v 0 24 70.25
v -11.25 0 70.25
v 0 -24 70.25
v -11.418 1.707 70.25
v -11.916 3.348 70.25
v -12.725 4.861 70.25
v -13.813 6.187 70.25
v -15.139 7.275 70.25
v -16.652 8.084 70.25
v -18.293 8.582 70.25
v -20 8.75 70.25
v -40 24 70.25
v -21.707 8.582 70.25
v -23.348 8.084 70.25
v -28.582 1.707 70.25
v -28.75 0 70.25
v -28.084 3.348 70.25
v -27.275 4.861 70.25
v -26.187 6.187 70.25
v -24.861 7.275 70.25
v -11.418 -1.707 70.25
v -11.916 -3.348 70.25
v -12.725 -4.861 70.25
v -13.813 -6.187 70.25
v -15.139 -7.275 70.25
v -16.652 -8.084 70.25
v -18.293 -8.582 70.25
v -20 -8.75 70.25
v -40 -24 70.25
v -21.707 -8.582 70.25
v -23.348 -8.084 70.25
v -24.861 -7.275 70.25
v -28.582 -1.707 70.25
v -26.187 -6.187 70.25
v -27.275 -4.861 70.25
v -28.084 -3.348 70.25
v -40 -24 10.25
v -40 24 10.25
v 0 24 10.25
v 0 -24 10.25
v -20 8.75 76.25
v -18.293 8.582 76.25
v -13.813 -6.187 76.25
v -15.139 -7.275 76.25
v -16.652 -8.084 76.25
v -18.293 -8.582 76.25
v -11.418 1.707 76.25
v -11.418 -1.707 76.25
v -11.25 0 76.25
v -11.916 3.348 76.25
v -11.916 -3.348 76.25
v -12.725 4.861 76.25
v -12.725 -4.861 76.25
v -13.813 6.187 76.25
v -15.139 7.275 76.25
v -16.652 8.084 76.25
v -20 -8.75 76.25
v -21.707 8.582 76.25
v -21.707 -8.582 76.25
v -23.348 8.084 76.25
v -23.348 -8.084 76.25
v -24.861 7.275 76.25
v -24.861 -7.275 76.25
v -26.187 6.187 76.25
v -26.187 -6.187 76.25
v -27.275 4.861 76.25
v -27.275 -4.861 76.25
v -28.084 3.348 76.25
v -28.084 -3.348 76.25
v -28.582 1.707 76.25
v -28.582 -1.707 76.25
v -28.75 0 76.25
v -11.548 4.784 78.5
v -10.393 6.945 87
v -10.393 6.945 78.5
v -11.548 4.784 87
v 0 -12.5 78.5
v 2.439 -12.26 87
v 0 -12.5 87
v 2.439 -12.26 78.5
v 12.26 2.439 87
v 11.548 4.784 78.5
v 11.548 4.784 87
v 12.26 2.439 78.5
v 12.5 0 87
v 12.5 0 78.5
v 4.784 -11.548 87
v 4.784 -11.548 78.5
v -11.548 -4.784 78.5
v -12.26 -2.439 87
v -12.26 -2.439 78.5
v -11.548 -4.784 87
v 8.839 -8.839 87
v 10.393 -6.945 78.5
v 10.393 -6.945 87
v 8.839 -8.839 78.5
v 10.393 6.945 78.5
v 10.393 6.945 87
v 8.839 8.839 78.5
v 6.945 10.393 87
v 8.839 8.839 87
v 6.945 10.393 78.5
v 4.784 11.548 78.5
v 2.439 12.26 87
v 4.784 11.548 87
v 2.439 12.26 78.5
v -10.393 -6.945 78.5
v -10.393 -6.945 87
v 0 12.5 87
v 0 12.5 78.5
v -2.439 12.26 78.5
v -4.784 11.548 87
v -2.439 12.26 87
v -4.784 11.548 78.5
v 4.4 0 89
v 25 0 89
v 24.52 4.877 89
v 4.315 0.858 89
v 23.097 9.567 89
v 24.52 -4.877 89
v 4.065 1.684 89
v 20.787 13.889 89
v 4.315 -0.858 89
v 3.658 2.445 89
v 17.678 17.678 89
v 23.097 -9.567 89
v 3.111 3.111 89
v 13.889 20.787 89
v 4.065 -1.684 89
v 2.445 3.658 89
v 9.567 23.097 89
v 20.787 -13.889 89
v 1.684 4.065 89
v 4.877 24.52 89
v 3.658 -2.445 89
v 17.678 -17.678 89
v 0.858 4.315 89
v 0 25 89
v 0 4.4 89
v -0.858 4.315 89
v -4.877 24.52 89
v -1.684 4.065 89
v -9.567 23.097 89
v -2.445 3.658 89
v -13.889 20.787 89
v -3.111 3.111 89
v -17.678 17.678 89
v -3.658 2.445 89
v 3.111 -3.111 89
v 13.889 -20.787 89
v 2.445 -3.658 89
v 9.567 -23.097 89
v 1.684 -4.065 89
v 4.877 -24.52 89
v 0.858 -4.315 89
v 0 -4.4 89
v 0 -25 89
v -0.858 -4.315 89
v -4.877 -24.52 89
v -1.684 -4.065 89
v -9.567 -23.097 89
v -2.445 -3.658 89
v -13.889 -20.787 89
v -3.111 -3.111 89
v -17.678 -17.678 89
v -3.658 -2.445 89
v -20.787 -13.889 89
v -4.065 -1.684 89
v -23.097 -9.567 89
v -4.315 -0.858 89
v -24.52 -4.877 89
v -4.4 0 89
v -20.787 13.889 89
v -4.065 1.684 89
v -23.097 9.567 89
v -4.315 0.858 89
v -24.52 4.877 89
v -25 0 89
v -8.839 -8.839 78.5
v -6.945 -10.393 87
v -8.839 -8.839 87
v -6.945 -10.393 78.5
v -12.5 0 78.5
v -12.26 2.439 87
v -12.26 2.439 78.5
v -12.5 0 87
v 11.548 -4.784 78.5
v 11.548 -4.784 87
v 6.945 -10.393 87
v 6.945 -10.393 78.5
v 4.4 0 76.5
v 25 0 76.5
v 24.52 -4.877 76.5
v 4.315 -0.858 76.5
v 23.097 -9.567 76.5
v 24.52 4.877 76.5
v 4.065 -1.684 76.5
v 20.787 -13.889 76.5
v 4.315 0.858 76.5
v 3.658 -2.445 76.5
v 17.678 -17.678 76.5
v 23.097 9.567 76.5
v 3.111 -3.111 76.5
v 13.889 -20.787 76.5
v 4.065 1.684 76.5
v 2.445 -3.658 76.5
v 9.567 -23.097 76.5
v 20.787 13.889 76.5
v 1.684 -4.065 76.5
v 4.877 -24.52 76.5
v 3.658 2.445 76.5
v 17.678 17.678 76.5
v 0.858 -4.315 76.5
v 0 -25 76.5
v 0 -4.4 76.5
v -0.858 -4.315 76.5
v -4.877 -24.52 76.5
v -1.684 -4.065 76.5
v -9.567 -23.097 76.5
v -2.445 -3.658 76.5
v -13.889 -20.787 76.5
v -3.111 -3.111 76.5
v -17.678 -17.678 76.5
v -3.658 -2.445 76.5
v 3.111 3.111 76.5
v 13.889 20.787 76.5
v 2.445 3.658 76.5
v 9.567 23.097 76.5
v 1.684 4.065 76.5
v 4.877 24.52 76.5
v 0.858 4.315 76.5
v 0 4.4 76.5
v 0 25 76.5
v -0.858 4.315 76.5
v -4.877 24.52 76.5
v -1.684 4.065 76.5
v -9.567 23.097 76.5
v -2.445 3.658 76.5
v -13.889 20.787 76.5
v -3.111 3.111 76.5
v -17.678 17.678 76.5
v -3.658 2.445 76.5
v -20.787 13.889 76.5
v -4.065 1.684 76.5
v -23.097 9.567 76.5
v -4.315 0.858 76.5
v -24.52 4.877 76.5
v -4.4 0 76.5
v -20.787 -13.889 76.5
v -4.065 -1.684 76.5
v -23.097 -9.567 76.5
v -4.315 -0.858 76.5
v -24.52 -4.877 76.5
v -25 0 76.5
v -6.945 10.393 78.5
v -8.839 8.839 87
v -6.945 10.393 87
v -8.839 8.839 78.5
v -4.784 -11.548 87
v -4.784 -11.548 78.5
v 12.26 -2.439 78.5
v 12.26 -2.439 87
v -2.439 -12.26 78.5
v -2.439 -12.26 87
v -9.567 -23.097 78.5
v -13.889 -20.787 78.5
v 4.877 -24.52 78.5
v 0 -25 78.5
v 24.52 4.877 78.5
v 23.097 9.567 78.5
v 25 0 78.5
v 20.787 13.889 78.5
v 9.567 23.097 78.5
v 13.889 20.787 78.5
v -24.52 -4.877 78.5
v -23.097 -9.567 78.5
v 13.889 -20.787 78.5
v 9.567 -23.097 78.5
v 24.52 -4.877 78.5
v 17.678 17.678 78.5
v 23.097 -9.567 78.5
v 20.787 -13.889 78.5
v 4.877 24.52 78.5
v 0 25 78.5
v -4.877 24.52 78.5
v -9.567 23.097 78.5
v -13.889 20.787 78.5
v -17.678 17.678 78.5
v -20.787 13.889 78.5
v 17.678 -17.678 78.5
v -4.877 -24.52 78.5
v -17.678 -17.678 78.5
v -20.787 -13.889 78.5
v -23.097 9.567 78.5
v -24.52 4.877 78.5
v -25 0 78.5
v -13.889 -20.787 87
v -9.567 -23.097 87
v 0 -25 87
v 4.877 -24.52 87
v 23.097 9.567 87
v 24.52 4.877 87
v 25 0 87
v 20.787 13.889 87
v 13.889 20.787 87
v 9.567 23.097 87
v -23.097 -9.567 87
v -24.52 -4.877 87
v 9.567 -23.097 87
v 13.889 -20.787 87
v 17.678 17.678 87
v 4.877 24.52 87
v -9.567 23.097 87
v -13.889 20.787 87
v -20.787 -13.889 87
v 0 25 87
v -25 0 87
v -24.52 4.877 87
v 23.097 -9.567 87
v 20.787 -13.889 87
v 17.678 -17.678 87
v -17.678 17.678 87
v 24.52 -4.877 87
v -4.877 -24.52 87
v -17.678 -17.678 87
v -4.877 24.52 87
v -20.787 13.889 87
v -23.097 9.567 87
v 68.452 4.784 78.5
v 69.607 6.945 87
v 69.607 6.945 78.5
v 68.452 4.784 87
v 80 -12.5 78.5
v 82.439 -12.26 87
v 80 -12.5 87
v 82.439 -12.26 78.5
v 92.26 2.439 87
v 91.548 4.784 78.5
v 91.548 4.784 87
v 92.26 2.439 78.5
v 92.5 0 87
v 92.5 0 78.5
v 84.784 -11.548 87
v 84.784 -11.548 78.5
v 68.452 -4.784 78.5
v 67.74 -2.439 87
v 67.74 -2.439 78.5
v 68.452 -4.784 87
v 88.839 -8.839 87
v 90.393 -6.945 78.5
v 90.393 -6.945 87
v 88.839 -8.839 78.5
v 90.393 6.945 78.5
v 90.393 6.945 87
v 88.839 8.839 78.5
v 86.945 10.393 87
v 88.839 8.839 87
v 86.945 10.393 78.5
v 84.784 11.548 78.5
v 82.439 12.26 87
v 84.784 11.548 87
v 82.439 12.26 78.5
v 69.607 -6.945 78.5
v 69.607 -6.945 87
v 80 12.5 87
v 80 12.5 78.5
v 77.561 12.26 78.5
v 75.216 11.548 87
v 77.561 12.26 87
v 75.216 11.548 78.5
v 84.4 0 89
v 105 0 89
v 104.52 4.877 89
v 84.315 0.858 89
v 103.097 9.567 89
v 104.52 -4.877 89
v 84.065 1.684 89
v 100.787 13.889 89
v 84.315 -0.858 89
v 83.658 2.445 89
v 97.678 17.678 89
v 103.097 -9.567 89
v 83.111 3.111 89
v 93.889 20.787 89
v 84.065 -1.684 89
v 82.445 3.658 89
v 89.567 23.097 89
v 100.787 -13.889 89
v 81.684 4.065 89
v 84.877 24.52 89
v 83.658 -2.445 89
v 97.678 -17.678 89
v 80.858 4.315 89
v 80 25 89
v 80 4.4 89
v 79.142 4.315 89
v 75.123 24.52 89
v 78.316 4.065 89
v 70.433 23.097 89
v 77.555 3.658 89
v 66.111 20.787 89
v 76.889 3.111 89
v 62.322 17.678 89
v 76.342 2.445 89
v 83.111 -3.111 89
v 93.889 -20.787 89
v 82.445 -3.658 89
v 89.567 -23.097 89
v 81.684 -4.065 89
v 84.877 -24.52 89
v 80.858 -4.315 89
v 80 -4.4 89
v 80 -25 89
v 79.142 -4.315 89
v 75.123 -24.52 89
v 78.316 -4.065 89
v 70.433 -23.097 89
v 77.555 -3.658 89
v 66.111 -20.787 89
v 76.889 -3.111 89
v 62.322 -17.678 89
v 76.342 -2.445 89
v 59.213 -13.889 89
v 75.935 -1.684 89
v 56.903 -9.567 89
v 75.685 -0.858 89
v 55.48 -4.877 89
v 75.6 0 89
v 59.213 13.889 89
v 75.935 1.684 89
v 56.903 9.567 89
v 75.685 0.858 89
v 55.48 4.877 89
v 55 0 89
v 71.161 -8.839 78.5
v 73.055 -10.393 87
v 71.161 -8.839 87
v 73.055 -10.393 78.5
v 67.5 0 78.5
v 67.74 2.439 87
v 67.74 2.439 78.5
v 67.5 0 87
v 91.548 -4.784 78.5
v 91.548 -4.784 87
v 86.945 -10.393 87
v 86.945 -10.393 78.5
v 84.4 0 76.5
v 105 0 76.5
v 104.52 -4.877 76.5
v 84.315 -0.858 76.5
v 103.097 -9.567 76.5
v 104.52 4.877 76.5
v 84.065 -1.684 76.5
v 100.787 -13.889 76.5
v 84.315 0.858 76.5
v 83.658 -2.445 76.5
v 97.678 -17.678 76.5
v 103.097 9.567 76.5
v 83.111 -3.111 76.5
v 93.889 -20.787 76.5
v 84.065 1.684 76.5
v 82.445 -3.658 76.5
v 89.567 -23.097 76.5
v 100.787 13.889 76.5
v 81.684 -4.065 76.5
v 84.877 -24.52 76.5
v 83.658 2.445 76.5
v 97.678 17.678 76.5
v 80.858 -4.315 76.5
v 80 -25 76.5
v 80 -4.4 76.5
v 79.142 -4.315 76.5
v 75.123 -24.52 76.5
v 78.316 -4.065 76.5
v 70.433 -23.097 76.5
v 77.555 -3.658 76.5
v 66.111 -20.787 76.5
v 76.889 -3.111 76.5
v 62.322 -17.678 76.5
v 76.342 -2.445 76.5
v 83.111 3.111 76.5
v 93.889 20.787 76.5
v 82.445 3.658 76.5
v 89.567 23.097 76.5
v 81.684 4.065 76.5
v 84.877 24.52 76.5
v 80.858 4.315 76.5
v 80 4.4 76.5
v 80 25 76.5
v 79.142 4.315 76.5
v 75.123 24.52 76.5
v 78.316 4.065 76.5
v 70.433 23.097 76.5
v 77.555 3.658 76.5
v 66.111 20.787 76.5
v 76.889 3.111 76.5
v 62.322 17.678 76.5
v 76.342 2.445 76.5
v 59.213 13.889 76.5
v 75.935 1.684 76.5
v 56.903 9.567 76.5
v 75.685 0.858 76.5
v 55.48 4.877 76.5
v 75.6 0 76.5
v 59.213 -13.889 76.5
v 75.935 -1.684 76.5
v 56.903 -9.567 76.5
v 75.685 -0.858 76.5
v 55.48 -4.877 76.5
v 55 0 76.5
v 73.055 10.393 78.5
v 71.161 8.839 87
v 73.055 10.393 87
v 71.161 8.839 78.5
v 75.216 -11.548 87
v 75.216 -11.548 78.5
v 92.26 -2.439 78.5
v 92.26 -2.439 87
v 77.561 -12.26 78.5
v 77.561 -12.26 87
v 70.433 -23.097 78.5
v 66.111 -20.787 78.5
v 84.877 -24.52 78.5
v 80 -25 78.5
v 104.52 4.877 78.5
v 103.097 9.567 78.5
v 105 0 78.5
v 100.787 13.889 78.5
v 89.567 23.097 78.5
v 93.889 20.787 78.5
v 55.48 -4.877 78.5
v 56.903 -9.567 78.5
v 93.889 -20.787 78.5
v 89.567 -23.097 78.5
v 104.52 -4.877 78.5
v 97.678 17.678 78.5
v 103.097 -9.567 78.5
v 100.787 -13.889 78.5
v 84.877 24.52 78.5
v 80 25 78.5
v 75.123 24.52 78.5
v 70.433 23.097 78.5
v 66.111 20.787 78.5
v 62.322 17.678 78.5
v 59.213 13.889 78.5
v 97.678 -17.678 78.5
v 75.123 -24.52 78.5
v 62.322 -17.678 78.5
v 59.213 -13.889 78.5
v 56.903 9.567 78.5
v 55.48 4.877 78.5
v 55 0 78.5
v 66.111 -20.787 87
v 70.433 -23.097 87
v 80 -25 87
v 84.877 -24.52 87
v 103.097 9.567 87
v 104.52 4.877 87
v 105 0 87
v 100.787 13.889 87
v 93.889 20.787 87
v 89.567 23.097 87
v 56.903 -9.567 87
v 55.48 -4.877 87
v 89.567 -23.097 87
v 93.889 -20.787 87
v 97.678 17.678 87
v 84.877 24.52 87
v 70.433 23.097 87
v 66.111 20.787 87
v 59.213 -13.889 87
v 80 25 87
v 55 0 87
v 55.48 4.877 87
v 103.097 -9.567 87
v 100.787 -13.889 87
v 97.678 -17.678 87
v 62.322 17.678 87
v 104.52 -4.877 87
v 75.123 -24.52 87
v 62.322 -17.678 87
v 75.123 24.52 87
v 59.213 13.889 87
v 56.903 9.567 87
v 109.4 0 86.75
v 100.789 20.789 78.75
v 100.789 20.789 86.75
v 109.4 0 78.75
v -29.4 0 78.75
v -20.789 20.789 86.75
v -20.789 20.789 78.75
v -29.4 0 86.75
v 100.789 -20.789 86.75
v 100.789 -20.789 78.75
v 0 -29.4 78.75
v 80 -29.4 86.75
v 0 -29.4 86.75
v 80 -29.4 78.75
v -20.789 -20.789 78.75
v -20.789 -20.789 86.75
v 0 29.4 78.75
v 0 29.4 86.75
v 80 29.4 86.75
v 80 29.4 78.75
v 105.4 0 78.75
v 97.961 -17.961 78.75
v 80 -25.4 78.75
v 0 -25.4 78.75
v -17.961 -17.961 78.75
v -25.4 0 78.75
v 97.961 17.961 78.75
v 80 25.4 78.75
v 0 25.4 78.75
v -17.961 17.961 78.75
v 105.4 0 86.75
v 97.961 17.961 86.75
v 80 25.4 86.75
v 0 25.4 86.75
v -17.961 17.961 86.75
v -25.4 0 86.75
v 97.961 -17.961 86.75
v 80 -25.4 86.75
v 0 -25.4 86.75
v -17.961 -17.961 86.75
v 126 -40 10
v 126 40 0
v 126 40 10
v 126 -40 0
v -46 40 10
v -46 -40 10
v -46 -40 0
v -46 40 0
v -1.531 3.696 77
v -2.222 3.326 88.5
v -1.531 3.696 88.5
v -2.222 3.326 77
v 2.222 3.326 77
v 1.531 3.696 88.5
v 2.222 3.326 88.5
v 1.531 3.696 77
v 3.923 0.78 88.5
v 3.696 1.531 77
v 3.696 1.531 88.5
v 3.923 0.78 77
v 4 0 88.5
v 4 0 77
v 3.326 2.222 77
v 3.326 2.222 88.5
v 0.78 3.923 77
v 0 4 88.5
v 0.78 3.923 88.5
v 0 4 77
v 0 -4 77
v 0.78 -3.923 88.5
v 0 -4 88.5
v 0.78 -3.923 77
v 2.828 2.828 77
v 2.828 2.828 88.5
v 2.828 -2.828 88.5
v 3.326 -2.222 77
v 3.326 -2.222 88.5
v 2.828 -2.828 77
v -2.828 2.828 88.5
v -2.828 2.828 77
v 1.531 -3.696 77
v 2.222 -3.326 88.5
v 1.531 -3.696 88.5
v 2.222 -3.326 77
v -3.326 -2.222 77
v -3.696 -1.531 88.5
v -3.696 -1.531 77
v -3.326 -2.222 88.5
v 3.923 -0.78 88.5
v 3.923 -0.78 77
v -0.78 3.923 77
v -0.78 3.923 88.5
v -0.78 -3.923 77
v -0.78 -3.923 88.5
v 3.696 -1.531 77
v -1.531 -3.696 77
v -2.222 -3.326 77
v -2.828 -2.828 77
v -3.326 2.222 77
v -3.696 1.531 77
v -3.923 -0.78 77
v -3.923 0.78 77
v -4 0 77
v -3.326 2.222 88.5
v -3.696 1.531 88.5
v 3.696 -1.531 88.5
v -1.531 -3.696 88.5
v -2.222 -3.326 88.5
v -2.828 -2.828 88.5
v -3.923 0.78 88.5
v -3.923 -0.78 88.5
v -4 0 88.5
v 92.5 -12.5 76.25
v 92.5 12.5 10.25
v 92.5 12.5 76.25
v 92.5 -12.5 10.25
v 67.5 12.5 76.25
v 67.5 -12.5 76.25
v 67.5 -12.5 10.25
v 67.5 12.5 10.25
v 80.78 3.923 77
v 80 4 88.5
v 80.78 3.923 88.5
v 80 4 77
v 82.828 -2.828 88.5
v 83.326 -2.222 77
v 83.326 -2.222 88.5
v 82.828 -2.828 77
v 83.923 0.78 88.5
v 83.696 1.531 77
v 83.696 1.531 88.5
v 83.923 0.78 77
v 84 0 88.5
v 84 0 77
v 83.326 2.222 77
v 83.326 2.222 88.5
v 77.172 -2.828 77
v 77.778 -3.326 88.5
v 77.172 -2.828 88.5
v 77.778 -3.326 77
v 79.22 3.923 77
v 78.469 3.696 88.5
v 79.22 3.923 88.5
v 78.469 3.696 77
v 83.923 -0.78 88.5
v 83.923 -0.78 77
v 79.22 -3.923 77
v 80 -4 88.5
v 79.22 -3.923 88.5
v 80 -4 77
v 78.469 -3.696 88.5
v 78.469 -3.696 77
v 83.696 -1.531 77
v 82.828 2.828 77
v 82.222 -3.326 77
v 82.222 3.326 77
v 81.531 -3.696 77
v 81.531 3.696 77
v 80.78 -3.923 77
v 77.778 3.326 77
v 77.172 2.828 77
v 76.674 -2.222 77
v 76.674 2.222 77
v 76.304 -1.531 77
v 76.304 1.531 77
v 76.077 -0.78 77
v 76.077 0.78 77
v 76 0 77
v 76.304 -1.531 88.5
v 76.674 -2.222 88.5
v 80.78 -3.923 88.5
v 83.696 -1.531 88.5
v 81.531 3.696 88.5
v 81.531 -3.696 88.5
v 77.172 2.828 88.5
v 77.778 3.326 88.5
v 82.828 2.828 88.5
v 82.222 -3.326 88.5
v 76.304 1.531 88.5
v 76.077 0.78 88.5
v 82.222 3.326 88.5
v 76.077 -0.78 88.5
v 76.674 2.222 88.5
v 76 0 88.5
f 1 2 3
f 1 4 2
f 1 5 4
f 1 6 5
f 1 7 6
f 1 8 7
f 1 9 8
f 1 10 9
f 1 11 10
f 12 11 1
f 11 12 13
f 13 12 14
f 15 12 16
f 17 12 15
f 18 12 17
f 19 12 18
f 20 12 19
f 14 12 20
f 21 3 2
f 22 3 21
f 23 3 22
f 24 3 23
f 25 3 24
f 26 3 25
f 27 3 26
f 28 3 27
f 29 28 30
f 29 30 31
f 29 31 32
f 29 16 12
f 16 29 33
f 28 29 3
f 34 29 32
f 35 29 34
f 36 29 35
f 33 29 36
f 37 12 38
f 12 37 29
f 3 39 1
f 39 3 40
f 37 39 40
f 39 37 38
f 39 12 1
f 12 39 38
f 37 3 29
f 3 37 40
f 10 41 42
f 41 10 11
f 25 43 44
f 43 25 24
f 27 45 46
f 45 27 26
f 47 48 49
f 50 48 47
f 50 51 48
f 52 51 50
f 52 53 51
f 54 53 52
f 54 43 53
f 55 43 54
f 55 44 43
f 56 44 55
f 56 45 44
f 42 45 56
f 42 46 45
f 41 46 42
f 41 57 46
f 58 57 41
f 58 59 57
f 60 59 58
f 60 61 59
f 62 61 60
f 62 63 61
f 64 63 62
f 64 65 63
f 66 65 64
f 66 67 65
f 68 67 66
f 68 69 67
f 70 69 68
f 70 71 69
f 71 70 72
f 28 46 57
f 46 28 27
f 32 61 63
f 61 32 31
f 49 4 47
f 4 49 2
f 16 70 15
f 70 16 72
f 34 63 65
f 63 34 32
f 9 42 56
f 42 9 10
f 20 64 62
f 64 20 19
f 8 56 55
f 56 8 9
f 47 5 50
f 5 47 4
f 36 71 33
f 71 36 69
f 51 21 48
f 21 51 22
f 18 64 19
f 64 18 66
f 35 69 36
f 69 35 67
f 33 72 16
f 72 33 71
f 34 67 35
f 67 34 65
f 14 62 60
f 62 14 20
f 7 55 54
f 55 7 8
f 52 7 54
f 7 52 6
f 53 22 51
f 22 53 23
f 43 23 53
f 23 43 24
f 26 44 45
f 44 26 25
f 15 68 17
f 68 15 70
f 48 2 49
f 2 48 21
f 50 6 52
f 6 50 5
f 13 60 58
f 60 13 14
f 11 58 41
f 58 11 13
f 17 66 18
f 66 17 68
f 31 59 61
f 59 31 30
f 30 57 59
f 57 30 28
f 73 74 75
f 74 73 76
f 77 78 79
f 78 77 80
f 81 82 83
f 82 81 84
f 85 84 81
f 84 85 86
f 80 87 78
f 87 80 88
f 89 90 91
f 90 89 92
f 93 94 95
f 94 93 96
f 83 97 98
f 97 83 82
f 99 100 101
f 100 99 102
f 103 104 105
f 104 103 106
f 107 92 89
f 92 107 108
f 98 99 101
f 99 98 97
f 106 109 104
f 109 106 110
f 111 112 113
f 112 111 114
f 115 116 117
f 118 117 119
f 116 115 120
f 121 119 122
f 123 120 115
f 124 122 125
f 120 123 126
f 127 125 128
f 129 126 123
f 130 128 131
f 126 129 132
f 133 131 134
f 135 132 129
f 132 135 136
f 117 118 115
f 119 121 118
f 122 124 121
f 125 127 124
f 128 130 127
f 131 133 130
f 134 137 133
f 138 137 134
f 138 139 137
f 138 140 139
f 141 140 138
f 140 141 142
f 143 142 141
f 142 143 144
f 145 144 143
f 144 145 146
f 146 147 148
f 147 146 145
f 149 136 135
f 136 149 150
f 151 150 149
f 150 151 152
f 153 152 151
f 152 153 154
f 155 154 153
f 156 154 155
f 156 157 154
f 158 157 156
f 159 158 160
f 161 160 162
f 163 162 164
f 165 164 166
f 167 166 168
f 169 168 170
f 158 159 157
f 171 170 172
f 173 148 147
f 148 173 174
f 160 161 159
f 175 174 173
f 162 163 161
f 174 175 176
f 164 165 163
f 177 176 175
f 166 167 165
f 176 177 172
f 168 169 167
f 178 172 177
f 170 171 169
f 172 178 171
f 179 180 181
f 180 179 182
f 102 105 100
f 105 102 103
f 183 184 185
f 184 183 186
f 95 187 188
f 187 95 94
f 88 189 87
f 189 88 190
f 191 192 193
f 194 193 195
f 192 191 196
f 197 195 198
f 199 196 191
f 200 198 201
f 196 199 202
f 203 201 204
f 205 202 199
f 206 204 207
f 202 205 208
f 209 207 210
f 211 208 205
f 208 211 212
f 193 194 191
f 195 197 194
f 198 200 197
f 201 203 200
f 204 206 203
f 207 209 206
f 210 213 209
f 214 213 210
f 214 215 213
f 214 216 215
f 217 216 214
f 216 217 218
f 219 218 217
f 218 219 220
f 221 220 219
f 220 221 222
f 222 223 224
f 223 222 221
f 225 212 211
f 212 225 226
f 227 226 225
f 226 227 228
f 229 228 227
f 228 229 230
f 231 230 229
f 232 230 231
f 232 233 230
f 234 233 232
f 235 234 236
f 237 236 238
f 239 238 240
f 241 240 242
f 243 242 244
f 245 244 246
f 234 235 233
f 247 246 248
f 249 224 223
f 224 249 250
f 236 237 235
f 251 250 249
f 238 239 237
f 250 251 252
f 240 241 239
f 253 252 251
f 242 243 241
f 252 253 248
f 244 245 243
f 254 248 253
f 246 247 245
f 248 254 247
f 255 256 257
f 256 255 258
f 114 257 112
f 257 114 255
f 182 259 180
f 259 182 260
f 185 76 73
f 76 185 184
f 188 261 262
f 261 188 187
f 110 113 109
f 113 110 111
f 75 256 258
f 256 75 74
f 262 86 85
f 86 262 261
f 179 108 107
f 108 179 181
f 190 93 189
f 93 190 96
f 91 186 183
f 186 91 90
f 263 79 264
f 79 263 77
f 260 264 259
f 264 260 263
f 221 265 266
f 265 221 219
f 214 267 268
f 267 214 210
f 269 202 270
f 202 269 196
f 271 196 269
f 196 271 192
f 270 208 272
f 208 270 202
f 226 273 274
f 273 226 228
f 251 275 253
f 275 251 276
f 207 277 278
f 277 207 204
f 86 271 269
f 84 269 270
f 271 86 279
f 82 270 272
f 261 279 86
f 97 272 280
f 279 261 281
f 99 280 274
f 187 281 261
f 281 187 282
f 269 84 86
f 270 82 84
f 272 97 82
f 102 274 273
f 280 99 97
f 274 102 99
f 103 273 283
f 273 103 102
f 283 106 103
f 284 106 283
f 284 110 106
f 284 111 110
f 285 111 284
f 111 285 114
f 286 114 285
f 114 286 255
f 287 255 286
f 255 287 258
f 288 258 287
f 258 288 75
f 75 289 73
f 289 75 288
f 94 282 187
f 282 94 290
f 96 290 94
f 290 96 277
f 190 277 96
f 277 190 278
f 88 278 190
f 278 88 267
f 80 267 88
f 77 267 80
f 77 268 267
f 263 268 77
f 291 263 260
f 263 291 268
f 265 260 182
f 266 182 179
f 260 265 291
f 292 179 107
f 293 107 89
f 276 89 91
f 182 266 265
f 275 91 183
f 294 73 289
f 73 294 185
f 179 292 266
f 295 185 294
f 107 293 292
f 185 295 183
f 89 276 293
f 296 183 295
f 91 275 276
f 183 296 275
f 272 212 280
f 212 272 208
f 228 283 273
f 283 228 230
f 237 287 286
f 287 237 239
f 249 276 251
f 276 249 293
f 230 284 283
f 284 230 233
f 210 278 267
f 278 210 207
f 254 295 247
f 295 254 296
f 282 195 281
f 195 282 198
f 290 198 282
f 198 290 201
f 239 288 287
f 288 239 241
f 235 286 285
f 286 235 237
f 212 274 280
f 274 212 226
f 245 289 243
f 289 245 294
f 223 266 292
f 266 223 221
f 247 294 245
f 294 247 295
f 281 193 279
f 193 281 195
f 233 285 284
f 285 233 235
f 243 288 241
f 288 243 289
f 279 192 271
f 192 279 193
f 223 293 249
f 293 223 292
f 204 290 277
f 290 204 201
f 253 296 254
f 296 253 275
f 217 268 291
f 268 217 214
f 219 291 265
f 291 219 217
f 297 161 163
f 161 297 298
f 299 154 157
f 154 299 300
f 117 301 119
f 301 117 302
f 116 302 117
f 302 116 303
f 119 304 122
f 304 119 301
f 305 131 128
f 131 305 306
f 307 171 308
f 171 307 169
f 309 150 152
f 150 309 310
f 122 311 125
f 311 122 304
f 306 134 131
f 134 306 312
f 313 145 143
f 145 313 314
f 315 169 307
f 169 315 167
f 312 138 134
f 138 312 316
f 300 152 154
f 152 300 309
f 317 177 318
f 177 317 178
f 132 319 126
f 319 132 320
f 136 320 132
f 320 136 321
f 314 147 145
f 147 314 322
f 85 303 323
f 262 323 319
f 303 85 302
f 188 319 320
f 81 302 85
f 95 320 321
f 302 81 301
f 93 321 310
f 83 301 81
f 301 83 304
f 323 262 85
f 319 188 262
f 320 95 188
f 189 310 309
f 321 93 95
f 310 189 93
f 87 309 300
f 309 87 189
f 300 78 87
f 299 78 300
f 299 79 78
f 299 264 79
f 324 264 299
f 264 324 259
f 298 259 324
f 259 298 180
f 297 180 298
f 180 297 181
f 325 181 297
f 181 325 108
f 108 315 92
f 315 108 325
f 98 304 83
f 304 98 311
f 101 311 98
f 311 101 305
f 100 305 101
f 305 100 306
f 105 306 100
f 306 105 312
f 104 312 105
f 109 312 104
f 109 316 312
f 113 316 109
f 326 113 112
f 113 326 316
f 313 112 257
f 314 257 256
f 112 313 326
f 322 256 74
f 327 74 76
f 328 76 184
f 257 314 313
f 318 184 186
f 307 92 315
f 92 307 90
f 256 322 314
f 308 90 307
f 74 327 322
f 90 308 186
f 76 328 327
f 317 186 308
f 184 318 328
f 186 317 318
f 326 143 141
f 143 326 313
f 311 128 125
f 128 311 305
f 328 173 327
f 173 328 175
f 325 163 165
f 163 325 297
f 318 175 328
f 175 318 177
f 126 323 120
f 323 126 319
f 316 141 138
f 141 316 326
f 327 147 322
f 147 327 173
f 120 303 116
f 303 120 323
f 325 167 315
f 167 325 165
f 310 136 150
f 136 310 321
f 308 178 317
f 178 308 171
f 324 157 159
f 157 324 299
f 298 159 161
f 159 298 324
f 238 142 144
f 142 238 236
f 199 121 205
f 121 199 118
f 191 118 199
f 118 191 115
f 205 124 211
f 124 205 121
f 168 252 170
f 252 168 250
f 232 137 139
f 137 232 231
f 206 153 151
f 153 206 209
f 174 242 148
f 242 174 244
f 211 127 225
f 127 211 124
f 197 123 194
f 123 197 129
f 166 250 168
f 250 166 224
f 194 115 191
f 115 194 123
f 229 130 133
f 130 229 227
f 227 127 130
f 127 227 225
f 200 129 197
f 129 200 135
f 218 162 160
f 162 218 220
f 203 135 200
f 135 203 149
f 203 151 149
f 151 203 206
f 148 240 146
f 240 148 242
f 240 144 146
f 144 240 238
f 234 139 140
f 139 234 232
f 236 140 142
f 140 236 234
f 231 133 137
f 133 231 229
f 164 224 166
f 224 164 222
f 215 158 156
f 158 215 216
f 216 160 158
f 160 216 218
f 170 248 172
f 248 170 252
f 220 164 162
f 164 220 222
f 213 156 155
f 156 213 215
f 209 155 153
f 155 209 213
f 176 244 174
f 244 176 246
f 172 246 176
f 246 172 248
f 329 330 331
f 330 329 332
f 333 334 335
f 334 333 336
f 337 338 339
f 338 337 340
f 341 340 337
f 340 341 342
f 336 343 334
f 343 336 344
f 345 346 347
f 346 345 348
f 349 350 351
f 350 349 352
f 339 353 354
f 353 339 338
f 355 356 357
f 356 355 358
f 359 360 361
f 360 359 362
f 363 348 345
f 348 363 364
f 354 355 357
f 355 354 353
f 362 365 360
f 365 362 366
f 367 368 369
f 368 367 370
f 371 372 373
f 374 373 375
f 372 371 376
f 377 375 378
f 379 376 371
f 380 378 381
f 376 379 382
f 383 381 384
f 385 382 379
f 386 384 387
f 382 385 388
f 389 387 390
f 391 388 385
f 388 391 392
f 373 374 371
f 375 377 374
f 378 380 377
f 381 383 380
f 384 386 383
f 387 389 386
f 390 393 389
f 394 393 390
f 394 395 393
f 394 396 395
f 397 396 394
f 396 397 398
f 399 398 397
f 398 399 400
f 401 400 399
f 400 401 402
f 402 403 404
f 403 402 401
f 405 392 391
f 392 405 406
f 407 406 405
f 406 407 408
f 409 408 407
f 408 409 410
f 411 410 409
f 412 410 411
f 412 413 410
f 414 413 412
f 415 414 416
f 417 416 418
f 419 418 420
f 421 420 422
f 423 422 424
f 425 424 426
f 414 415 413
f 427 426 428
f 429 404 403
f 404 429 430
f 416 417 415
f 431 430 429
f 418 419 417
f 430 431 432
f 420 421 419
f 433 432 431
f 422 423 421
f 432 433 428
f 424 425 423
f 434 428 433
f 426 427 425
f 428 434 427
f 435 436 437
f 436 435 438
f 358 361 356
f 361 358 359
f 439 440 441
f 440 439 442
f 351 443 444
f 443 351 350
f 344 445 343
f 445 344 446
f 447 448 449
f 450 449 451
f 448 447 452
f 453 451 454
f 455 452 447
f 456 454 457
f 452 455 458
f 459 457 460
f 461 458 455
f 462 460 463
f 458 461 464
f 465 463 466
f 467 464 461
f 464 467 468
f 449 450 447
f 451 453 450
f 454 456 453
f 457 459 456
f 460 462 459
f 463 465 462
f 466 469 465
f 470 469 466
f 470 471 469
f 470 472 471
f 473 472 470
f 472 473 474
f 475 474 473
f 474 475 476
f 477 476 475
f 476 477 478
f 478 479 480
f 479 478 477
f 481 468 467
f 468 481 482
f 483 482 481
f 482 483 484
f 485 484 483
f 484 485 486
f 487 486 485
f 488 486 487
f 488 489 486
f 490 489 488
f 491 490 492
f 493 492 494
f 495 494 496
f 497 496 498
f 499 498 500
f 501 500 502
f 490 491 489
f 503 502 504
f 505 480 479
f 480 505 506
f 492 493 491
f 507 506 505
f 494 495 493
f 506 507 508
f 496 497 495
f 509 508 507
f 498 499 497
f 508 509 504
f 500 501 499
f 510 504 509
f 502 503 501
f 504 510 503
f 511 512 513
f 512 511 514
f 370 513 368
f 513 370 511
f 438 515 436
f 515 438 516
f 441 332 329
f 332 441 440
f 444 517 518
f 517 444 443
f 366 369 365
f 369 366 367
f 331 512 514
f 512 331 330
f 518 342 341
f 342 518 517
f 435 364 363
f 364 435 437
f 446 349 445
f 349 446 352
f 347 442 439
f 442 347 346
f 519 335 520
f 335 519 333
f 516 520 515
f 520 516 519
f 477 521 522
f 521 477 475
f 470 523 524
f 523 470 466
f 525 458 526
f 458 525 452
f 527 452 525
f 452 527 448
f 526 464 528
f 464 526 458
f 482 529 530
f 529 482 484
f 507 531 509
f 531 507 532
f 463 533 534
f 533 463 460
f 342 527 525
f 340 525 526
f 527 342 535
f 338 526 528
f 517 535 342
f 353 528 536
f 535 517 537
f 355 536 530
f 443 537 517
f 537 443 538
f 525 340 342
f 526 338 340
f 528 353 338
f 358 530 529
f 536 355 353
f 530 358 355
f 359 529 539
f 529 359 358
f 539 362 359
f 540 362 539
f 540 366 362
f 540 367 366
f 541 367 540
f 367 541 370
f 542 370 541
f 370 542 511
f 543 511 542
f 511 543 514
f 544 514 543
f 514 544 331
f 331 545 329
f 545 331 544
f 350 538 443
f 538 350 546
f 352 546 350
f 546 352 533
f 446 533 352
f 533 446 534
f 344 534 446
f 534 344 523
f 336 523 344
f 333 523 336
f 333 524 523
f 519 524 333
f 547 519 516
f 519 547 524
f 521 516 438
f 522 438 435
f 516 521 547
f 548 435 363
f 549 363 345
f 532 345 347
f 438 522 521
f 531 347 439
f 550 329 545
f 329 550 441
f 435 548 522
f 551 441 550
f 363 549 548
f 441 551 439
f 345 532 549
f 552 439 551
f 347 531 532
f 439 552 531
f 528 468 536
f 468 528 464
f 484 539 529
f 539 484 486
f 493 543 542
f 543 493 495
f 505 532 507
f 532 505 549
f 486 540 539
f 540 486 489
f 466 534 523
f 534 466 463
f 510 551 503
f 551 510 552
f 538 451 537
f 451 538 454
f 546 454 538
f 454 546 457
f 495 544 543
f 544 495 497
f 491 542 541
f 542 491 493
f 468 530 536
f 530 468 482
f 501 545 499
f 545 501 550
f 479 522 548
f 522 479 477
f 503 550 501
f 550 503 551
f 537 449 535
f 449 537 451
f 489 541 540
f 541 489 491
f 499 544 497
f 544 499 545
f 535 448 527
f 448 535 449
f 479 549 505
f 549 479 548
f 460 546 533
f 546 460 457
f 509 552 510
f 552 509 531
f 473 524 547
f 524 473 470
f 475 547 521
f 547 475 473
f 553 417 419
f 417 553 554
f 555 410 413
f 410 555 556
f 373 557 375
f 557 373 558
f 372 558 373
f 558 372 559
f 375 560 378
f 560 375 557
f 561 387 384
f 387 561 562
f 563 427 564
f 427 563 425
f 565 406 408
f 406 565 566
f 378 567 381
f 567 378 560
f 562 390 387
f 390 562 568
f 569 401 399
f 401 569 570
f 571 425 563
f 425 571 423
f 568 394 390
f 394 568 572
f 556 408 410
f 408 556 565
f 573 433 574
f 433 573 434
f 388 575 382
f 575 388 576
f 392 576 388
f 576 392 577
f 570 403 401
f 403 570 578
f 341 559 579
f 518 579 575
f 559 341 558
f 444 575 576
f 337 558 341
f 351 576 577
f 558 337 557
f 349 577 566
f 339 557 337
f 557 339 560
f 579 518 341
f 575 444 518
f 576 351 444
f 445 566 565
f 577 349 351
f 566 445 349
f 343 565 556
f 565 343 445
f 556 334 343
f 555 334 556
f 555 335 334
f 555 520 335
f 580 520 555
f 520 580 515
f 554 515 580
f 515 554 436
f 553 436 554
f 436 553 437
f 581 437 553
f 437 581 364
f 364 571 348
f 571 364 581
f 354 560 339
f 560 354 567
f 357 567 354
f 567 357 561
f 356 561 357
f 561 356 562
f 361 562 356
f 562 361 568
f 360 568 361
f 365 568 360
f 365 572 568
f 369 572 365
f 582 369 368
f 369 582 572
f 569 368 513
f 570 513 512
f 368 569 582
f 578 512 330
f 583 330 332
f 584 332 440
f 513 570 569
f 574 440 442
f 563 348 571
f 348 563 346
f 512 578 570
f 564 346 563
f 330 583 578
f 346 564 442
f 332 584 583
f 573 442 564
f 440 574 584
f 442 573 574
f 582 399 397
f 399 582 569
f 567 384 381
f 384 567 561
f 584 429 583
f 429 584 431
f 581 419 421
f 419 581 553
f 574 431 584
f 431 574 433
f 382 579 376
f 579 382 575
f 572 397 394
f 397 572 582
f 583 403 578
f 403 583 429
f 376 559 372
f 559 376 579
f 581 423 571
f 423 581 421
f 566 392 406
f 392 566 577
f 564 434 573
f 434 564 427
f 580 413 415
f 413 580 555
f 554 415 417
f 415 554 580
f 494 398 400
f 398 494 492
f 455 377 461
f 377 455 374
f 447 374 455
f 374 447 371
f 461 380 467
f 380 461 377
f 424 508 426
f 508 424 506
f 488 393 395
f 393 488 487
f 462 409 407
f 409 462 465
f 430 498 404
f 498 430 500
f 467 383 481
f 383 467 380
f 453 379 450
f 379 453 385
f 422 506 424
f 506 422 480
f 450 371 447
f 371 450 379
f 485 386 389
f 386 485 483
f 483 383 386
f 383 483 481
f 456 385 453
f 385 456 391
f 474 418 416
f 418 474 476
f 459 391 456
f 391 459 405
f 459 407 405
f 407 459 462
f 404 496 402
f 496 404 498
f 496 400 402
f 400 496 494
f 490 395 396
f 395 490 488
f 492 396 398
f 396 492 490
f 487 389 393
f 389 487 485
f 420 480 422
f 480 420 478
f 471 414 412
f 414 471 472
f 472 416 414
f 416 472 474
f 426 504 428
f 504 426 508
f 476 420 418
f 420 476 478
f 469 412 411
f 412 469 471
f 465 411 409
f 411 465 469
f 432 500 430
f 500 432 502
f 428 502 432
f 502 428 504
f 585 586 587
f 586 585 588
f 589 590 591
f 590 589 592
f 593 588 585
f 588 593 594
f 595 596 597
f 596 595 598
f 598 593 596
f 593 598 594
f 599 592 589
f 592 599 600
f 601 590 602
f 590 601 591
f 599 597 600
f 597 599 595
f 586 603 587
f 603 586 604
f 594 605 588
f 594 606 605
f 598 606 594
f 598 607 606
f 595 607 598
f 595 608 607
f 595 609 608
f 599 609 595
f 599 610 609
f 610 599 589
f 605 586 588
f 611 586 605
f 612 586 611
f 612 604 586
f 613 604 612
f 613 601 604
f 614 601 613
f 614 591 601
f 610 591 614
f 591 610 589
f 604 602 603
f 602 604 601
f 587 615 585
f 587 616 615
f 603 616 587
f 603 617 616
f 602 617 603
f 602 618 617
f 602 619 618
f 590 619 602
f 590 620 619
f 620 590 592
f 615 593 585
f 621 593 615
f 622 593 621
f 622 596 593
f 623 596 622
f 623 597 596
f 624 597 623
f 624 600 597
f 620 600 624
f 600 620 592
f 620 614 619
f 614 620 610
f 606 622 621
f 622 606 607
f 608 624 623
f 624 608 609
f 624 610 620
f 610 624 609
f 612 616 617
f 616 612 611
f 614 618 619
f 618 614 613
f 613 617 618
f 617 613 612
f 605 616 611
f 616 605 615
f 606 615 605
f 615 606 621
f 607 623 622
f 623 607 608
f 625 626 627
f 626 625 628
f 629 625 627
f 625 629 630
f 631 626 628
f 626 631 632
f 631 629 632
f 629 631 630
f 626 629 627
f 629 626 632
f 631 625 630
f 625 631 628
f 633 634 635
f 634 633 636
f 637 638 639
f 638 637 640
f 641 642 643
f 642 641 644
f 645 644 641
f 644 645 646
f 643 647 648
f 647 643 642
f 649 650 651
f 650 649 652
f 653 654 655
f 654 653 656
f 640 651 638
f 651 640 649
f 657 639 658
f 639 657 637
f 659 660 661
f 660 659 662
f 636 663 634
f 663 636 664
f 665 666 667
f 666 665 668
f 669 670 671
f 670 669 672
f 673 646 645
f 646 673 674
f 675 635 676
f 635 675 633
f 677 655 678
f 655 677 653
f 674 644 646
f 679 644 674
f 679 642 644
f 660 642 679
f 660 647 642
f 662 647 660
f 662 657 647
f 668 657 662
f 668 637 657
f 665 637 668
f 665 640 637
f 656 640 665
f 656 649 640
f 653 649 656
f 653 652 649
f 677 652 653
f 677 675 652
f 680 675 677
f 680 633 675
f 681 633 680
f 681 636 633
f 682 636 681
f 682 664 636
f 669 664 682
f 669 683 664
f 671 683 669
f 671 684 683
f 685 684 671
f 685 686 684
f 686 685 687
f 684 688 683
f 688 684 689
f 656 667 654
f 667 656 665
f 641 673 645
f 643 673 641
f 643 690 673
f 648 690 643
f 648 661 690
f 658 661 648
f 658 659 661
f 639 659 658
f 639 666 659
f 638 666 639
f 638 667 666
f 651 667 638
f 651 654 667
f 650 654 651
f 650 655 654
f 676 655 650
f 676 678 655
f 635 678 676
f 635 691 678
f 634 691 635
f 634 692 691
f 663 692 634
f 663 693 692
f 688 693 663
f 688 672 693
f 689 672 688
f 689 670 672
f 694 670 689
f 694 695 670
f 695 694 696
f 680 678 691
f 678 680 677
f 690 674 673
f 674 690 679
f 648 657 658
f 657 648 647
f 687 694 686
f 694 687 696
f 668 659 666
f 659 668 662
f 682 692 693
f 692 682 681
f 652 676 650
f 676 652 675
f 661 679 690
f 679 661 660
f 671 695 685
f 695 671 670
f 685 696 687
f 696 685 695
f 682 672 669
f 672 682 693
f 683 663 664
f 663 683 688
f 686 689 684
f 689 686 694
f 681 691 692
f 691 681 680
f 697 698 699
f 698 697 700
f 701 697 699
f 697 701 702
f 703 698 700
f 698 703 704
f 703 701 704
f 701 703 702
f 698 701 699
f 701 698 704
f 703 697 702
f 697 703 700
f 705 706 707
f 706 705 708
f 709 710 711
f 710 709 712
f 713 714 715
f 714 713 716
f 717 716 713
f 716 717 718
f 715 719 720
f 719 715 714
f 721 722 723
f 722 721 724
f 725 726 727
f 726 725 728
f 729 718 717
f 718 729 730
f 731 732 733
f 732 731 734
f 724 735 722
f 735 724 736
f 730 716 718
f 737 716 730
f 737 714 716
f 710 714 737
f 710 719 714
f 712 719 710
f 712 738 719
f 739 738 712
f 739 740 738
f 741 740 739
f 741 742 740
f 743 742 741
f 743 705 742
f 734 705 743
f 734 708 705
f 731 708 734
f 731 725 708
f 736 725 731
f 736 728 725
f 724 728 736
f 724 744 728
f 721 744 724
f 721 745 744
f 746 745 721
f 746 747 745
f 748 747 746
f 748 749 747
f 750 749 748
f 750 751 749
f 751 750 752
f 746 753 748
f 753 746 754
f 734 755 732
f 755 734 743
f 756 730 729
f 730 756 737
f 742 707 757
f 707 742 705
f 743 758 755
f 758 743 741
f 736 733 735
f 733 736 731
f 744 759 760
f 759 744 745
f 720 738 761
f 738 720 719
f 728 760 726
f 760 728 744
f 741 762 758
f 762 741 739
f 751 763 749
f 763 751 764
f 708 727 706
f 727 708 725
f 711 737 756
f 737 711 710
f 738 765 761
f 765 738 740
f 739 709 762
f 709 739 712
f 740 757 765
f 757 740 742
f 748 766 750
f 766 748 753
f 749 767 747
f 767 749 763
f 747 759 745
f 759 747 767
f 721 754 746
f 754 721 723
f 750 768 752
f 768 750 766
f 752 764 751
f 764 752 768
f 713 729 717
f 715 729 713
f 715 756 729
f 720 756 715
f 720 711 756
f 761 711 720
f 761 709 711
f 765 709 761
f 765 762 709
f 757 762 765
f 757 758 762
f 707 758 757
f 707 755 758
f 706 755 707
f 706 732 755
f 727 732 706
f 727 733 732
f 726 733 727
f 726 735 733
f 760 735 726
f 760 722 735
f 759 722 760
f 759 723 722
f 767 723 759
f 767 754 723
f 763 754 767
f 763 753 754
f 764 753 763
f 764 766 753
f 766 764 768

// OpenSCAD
$fn = 32;

// ------------------------------------------------------------------------
// Motor belt drive: span 80 mm, pulleys d50, belt 8 mm wide
// Every part is its own module, assembly() places every instance.
// ------------------------------------------------------------------------

// --- part 1 ---
module base_plate() {
  difference() {
    translate([-86, -40, 0]) cube([172, 80, 10]);
  }
}

// --- part 2 ---
module motor() {
  union() {
    translate([-30, -24, 0]) cube([60, 48, 40]);
    translate([33, 0, 20]) rotate([0, 90, 0]) cylinder(h = 6, d = 17.5, center = true);
  }
}

// --- part 3 ---
module drive_shaft() {
  translate([0, 0, -5.75]) cylinder(h = 11.5, d = 8);
}

// --- part 4 ---
module pulley_drive() {
  difference() {
    union() {
      cylinder(h = 12.5, d = 25);
      cylinder(h = 2, d = 50);
      translate([0, 0, 10.5]) cylinder(h = 2, d = 50);
    }
    translate([0, 0, -1]) cylinder(h = 14.5, d = 8.8);
  }
}

// --- part 5 ---
module idler_post() {
  translate([-12.5, -12.5, 0]) cube([25, 25, 66]);
}

// --- part 6 ---
module driven_shaft() {
  translate([0, 0, -5.75]) cylinder(h = 11.5, d = 8);
}

// --- part 7 ---
module pulley_driven() {
  difference() {
    union() {
      cylinder(h = 12.5, d = 25);
      cylinder(h = 2, d = 50);
      translate([0, 0, 10.5]) cylinder(h = 2, d = 50);
    }
    translate([0, 0, -1]) cylinder(h = 14.5, d = 8.8);
  }
}

// --- part 8 ---
module drive_belt() {
  difference() {
    linear_extrude(height = 8) polygon(points = concat([for (a = [90 : 45 : 270]) [29.4 * cos(a), 29.4 * sin(a)]], [for (a = [270 : 45 : 450]) [80 + 29.4 * cos(a), 29.4 * sin(a)]]));
    translate([0, 0, -1]) linear_extrude(height = 10) polygon(points = concat([for (a = [90 : 45 : 270]) [25.4 * cos(a), 25.4 * sin(a)]], [for (a = [270 : 45 : 450]) [80 + 25.4 * cos(a), 25.4 * sin(a)]]));
  }
}

// --- assembly ---
module assembly() {
  color([0.80, 0.24, 0.20]) translate([40, 0, 0]) rotate([0, 0, 0]) base_plate();
  color([0.20, 0.45, 0.75]) translate([0, 0, 40.25]) rotate([0, 270, 0]) motor();
  color([0.25, 0.62, 0.32]) translate([0, 0, 82.75]) rotate([0, 0, 0]) drive_shaft();
  color([0.92, 0.70, 0.18]) translate([0, 0, 76.5]) rotate([0, 0, 0]) pulley_drive();
  color([0.58, 0.35, 0.70]) translate([80, 0, 10.25]) rotate([0, 0, 0]) idler_post();
  color([0.16, 0.66, 0.66]) translate([80, 0, 82.75]) rotate([0, 0, 0]) driven_shaft();
  color([0.85, 0.48, 0.18]) translate([80, 0, 76.5]) rotate([0, 0, 0]) pulley_driven();
  color([0.55, 0.60, 0.65]) translate([0, 0, 78.75]) rotate([0, 0, 0]) drive_belt();
}

assembly();
